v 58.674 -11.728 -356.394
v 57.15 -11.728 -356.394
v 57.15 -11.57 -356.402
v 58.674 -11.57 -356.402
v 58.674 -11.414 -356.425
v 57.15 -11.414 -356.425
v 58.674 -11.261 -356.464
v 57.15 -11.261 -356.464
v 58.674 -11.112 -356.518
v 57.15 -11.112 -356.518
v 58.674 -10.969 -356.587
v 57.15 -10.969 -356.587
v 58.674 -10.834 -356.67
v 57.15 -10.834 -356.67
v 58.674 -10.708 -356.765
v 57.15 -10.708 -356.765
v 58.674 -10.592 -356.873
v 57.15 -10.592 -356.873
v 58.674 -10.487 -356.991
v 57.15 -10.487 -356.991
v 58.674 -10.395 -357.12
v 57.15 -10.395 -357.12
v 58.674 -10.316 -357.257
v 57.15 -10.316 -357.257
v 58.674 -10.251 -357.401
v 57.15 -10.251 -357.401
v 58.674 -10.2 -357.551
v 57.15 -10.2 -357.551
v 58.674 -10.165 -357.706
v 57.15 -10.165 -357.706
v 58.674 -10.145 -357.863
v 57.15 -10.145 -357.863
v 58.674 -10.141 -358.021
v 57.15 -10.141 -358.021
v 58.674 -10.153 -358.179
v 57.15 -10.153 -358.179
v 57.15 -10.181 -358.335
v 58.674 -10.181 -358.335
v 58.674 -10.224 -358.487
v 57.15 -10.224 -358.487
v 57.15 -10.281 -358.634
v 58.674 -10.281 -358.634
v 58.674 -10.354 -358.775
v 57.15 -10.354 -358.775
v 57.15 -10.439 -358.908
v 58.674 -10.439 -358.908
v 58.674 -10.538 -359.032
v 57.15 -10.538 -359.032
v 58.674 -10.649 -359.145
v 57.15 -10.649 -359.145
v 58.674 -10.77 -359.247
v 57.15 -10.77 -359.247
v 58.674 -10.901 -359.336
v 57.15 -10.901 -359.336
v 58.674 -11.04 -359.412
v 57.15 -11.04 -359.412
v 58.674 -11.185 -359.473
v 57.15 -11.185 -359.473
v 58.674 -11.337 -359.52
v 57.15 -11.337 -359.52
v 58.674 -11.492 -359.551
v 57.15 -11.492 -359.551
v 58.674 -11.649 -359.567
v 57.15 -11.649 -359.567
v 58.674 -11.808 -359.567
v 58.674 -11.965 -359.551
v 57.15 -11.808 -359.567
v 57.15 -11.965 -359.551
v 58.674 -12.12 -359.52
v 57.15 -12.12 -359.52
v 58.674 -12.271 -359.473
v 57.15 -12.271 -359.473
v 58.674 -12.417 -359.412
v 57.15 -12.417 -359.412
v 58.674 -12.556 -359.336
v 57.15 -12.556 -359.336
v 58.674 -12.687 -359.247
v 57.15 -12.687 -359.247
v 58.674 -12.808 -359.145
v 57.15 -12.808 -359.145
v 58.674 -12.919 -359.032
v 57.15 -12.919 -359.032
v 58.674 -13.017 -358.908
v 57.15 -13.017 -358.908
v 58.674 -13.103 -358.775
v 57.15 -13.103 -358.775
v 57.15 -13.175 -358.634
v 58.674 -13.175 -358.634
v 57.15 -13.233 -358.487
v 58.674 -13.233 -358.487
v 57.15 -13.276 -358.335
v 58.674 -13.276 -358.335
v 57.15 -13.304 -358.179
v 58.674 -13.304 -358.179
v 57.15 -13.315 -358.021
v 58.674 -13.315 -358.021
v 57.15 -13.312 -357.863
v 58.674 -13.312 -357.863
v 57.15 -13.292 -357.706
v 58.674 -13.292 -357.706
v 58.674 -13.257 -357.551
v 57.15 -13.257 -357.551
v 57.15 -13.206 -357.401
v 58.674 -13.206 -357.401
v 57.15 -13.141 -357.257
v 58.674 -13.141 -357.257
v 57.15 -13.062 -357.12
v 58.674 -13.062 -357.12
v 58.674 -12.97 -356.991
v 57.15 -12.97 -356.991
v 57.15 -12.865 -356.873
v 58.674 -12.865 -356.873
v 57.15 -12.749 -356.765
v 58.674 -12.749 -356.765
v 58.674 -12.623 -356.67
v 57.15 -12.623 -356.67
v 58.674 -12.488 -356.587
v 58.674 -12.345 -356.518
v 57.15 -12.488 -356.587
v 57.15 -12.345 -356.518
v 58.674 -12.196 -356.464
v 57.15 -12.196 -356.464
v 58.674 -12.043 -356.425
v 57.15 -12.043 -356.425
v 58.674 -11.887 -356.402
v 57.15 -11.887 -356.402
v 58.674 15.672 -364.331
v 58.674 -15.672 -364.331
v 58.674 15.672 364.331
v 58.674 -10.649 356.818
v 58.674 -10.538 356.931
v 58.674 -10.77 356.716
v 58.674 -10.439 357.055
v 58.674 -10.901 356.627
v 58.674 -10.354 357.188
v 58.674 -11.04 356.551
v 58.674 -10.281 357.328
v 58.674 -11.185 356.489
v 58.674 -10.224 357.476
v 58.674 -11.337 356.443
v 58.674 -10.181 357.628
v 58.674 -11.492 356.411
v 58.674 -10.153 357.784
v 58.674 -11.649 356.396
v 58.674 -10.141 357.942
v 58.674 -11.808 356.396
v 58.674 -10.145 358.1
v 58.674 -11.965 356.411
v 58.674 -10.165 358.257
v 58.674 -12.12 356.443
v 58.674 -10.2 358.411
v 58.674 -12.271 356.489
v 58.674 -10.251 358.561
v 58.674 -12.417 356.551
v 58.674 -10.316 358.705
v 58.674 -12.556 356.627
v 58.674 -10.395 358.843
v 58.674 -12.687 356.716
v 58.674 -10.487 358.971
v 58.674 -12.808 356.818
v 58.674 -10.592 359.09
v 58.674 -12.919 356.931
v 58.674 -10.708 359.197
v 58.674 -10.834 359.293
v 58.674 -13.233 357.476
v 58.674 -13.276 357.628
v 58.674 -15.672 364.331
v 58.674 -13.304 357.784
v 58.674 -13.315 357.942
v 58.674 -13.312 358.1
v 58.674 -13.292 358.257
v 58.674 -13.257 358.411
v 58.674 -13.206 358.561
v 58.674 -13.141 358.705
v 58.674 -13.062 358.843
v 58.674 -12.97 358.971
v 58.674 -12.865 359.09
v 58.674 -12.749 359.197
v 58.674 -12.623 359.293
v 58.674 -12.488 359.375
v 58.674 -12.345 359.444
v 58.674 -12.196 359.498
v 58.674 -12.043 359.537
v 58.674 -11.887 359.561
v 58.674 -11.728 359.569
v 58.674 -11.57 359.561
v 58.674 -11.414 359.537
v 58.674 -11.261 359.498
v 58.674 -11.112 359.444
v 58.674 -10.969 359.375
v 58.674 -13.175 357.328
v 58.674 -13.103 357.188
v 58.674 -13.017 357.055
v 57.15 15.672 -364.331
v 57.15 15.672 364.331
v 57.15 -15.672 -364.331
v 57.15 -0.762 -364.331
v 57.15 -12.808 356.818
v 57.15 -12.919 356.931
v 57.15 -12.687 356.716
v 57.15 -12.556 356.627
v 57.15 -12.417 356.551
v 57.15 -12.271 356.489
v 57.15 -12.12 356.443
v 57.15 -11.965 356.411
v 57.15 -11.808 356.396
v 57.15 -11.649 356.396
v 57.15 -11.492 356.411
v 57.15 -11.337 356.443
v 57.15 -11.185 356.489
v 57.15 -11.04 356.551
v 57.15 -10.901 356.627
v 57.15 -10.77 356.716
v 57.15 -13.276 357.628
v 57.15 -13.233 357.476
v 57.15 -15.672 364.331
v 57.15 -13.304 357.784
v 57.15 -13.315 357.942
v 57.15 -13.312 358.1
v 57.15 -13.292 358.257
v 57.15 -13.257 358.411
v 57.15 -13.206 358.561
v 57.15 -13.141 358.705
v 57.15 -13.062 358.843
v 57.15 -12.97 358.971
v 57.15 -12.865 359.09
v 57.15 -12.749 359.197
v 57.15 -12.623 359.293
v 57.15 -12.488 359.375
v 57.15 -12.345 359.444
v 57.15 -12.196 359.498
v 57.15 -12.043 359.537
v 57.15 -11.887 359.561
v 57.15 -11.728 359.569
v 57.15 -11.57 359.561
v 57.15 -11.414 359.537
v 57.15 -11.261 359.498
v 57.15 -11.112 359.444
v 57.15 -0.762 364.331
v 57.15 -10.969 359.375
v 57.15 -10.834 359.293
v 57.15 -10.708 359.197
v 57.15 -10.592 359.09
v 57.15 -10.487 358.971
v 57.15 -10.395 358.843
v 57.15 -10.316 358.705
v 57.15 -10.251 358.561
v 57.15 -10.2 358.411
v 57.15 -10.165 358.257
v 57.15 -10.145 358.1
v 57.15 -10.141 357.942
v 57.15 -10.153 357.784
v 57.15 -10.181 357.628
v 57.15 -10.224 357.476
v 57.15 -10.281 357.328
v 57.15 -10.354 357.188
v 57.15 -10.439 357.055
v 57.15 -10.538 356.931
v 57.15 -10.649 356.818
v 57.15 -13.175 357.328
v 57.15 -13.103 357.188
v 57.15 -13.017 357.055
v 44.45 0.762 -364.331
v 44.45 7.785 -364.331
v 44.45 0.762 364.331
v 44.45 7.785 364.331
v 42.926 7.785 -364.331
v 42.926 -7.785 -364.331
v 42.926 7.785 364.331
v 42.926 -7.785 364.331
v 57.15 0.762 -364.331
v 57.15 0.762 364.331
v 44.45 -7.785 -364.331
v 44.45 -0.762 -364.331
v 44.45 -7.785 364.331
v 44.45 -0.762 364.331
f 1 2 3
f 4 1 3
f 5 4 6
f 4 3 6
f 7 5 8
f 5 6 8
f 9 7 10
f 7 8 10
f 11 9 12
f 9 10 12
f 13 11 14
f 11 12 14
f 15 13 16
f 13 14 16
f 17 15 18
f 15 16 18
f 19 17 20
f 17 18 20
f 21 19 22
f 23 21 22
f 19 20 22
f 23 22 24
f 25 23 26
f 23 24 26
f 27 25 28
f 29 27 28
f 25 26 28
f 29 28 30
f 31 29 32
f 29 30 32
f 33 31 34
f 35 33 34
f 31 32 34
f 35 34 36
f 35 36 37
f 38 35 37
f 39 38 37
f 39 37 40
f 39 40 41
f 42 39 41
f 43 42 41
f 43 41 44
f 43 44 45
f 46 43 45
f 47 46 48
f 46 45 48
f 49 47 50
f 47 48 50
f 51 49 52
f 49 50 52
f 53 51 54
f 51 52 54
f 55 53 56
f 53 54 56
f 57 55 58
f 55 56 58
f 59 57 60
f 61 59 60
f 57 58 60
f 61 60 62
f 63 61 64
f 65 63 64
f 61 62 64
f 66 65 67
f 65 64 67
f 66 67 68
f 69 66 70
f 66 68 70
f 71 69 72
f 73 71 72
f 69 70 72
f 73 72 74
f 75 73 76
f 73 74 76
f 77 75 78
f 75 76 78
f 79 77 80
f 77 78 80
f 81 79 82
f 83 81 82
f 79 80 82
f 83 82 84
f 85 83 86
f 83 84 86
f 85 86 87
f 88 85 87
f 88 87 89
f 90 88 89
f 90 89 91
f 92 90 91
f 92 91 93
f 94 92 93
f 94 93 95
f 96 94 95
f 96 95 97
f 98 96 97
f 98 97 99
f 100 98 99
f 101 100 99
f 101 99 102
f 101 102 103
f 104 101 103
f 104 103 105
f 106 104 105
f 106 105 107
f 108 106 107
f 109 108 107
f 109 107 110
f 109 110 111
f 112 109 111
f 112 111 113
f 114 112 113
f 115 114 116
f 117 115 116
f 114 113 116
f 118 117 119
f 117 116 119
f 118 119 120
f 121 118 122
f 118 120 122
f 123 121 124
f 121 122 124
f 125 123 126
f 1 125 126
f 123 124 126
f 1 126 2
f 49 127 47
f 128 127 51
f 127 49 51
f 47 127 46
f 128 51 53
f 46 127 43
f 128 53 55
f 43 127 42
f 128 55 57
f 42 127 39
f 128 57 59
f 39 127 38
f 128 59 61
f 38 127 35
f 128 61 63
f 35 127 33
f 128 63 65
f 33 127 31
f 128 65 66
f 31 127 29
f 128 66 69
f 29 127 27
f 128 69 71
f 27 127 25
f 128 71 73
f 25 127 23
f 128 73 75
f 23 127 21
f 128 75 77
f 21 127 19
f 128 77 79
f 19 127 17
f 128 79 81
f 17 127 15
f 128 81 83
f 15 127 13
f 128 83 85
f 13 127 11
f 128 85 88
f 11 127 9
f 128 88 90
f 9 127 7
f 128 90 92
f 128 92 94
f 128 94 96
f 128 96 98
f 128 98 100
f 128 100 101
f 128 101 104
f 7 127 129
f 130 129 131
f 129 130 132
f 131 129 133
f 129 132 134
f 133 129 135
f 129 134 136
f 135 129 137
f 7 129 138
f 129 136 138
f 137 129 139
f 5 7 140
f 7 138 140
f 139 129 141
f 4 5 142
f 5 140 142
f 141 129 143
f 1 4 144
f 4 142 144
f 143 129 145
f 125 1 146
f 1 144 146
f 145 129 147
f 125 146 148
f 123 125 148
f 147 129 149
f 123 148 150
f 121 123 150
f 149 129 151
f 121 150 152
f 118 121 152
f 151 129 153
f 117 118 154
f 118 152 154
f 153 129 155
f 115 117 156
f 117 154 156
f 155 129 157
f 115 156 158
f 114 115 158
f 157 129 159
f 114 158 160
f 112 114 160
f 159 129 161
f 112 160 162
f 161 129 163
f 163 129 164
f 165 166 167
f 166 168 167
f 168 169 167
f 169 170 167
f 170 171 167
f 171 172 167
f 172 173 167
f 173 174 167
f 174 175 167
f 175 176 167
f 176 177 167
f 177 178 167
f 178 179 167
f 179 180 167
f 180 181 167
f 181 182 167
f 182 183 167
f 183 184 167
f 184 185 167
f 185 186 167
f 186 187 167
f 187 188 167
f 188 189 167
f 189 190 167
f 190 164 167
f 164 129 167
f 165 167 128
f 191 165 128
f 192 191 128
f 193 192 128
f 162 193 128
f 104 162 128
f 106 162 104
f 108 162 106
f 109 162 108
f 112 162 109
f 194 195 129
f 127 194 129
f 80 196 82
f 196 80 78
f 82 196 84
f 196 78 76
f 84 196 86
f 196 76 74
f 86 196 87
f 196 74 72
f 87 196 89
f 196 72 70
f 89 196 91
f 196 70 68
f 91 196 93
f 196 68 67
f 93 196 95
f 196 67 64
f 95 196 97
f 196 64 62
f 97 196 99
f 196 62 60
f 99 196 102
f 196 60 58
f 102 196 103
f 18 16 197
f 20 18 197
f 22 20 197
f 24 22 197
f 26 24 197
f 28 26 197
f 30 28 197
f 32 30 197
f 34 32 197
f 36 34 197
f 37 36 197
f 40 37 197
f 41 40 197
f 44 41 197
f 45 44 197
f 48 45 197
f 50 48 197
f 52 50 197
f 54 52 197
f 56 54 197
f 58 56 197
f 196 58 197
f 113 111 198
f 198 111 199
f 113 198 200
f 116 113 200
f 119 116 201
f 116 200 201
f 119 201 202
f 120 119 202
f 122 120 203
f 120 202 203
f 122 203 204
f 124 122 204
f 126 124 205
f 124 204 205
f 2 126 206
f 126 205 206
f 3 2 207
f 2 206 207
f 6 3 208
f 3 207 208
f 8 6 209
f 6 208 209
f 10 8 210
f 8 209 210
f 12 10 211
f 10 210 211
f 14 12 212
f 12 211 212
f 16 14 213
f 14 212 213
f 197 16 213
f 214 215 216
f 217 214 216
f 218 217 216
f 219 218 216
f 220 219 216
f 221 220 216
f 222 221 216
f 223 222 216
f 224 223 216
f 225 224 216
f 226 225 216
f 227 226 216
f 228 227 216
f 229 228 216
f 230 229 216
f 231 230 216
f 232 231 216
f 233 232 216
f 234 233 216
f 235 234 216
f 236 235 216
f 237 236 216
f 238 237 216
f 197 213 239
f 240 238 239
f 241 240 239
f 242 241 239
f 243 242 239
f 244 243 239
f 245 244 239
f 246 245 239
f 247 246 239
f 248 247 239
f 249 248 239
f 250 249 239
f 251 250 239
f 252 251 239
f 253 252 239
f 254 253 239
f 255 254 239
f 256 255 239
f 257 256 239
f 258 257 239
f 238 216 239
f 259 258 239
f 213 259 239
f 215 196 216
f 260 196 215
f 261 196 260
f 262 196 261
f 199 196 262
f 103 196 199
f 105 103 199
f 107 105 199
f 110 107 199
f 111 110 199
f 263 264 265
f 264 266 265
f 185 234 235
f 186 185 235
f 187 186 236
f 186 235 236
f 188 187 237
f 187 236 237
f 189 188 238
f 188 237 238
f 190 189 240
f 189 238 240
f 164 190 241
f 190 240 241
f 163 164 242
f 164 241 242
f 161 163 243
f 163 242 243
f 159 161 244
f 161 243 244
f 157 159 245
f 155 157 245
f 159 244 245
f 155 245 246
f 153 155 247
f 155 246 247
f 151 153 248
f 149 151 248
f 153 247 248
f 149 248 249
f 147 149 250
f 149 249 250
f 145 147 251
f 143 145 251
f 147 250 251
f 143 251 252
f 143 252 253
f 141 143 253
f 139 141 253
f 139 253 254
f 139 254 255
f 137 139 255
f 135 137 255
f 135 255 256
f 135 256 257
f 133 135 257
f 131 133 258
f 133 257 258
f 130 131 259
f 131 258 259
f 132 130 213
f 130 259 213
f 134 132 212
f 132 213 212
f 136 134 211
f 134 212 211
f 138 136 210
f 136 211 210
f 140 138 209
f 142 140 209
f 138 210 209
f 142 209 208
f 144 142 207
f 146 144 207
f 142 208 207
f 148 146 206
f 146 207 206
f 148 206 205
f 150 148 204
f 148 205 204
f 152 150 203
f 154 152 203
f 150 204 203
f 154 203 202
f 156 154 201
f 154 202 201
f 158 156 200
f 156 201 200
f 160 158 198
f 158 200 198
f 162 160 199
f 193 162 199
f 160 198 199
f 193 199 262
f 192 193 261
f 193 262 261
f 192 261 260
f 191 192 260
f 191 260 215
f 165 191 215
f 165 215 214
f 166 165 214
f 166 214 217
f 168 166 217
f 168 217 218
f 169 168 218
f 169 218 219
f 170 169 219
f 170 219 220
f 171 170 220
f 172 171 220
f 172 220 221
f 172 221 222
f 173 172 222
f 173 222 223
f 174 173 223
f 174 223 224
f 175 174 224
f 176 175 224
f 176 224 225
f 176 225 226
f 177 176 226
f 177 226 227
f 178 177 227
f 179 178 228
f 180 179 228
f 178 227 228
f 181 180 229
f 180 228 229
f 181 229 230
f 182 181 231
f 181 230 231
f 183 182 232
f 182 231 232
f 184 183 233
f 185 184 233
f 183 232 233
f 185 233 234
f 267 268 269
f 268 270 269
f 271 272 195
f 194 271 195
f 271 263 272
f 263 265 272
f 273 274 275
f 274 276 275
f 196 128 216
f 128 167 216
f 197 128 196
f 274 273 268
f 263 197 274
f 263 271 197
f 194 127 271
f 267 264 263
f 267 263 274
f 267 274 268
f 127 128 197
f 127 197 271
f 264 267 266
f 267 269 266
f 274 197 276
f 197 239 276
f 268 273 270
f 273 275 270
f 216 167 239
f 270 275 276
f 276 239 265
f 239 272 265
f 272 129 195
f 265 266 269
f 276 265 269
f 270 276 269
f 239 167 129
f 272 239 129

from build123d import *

# Parameters (mm, degrees)
EXTRUDE1_DEPTH     = 364.33125
SKETCH2_R          = 1.5875
CUT_EXTRUDE1_DEPTH = 1.524


with BuildPart() as part:
    # Sketch1 → Extrude1 (new body, symmetric)
    with BuildSketch(Plane.XY):
        Polygon((58.674, 15.6718), (58.674, -15.6718), (57.15, -15.6718), (57.15, -0.762), (44.45, -0.762), (44.45, -7.7851), (42.926, -7.7851), (42.926, 7.7851), (44.45, 7.7851), (44.45, 0.762), (57.15, 0.762), (57.15, 15.6718), align=None)
    extrude(amount=EXTRUDE1_DEPTH, both=True)

    # Sketch2 → Cut-Extrude1 (cut)
    with BuildSketch(Plane.ZY.offset(-57.15)):
        with Locations((357.98125, -11.72845)):
            Circle(SKETCH2_R)
        with Locations((-357.98125, -11.72845)):
            Circle(SKETCH2_R)
    extrude(amount=-CUT_EXTRUDE1_DEPTH, mode=Mode.SUBTRACT)


solid = part.part
